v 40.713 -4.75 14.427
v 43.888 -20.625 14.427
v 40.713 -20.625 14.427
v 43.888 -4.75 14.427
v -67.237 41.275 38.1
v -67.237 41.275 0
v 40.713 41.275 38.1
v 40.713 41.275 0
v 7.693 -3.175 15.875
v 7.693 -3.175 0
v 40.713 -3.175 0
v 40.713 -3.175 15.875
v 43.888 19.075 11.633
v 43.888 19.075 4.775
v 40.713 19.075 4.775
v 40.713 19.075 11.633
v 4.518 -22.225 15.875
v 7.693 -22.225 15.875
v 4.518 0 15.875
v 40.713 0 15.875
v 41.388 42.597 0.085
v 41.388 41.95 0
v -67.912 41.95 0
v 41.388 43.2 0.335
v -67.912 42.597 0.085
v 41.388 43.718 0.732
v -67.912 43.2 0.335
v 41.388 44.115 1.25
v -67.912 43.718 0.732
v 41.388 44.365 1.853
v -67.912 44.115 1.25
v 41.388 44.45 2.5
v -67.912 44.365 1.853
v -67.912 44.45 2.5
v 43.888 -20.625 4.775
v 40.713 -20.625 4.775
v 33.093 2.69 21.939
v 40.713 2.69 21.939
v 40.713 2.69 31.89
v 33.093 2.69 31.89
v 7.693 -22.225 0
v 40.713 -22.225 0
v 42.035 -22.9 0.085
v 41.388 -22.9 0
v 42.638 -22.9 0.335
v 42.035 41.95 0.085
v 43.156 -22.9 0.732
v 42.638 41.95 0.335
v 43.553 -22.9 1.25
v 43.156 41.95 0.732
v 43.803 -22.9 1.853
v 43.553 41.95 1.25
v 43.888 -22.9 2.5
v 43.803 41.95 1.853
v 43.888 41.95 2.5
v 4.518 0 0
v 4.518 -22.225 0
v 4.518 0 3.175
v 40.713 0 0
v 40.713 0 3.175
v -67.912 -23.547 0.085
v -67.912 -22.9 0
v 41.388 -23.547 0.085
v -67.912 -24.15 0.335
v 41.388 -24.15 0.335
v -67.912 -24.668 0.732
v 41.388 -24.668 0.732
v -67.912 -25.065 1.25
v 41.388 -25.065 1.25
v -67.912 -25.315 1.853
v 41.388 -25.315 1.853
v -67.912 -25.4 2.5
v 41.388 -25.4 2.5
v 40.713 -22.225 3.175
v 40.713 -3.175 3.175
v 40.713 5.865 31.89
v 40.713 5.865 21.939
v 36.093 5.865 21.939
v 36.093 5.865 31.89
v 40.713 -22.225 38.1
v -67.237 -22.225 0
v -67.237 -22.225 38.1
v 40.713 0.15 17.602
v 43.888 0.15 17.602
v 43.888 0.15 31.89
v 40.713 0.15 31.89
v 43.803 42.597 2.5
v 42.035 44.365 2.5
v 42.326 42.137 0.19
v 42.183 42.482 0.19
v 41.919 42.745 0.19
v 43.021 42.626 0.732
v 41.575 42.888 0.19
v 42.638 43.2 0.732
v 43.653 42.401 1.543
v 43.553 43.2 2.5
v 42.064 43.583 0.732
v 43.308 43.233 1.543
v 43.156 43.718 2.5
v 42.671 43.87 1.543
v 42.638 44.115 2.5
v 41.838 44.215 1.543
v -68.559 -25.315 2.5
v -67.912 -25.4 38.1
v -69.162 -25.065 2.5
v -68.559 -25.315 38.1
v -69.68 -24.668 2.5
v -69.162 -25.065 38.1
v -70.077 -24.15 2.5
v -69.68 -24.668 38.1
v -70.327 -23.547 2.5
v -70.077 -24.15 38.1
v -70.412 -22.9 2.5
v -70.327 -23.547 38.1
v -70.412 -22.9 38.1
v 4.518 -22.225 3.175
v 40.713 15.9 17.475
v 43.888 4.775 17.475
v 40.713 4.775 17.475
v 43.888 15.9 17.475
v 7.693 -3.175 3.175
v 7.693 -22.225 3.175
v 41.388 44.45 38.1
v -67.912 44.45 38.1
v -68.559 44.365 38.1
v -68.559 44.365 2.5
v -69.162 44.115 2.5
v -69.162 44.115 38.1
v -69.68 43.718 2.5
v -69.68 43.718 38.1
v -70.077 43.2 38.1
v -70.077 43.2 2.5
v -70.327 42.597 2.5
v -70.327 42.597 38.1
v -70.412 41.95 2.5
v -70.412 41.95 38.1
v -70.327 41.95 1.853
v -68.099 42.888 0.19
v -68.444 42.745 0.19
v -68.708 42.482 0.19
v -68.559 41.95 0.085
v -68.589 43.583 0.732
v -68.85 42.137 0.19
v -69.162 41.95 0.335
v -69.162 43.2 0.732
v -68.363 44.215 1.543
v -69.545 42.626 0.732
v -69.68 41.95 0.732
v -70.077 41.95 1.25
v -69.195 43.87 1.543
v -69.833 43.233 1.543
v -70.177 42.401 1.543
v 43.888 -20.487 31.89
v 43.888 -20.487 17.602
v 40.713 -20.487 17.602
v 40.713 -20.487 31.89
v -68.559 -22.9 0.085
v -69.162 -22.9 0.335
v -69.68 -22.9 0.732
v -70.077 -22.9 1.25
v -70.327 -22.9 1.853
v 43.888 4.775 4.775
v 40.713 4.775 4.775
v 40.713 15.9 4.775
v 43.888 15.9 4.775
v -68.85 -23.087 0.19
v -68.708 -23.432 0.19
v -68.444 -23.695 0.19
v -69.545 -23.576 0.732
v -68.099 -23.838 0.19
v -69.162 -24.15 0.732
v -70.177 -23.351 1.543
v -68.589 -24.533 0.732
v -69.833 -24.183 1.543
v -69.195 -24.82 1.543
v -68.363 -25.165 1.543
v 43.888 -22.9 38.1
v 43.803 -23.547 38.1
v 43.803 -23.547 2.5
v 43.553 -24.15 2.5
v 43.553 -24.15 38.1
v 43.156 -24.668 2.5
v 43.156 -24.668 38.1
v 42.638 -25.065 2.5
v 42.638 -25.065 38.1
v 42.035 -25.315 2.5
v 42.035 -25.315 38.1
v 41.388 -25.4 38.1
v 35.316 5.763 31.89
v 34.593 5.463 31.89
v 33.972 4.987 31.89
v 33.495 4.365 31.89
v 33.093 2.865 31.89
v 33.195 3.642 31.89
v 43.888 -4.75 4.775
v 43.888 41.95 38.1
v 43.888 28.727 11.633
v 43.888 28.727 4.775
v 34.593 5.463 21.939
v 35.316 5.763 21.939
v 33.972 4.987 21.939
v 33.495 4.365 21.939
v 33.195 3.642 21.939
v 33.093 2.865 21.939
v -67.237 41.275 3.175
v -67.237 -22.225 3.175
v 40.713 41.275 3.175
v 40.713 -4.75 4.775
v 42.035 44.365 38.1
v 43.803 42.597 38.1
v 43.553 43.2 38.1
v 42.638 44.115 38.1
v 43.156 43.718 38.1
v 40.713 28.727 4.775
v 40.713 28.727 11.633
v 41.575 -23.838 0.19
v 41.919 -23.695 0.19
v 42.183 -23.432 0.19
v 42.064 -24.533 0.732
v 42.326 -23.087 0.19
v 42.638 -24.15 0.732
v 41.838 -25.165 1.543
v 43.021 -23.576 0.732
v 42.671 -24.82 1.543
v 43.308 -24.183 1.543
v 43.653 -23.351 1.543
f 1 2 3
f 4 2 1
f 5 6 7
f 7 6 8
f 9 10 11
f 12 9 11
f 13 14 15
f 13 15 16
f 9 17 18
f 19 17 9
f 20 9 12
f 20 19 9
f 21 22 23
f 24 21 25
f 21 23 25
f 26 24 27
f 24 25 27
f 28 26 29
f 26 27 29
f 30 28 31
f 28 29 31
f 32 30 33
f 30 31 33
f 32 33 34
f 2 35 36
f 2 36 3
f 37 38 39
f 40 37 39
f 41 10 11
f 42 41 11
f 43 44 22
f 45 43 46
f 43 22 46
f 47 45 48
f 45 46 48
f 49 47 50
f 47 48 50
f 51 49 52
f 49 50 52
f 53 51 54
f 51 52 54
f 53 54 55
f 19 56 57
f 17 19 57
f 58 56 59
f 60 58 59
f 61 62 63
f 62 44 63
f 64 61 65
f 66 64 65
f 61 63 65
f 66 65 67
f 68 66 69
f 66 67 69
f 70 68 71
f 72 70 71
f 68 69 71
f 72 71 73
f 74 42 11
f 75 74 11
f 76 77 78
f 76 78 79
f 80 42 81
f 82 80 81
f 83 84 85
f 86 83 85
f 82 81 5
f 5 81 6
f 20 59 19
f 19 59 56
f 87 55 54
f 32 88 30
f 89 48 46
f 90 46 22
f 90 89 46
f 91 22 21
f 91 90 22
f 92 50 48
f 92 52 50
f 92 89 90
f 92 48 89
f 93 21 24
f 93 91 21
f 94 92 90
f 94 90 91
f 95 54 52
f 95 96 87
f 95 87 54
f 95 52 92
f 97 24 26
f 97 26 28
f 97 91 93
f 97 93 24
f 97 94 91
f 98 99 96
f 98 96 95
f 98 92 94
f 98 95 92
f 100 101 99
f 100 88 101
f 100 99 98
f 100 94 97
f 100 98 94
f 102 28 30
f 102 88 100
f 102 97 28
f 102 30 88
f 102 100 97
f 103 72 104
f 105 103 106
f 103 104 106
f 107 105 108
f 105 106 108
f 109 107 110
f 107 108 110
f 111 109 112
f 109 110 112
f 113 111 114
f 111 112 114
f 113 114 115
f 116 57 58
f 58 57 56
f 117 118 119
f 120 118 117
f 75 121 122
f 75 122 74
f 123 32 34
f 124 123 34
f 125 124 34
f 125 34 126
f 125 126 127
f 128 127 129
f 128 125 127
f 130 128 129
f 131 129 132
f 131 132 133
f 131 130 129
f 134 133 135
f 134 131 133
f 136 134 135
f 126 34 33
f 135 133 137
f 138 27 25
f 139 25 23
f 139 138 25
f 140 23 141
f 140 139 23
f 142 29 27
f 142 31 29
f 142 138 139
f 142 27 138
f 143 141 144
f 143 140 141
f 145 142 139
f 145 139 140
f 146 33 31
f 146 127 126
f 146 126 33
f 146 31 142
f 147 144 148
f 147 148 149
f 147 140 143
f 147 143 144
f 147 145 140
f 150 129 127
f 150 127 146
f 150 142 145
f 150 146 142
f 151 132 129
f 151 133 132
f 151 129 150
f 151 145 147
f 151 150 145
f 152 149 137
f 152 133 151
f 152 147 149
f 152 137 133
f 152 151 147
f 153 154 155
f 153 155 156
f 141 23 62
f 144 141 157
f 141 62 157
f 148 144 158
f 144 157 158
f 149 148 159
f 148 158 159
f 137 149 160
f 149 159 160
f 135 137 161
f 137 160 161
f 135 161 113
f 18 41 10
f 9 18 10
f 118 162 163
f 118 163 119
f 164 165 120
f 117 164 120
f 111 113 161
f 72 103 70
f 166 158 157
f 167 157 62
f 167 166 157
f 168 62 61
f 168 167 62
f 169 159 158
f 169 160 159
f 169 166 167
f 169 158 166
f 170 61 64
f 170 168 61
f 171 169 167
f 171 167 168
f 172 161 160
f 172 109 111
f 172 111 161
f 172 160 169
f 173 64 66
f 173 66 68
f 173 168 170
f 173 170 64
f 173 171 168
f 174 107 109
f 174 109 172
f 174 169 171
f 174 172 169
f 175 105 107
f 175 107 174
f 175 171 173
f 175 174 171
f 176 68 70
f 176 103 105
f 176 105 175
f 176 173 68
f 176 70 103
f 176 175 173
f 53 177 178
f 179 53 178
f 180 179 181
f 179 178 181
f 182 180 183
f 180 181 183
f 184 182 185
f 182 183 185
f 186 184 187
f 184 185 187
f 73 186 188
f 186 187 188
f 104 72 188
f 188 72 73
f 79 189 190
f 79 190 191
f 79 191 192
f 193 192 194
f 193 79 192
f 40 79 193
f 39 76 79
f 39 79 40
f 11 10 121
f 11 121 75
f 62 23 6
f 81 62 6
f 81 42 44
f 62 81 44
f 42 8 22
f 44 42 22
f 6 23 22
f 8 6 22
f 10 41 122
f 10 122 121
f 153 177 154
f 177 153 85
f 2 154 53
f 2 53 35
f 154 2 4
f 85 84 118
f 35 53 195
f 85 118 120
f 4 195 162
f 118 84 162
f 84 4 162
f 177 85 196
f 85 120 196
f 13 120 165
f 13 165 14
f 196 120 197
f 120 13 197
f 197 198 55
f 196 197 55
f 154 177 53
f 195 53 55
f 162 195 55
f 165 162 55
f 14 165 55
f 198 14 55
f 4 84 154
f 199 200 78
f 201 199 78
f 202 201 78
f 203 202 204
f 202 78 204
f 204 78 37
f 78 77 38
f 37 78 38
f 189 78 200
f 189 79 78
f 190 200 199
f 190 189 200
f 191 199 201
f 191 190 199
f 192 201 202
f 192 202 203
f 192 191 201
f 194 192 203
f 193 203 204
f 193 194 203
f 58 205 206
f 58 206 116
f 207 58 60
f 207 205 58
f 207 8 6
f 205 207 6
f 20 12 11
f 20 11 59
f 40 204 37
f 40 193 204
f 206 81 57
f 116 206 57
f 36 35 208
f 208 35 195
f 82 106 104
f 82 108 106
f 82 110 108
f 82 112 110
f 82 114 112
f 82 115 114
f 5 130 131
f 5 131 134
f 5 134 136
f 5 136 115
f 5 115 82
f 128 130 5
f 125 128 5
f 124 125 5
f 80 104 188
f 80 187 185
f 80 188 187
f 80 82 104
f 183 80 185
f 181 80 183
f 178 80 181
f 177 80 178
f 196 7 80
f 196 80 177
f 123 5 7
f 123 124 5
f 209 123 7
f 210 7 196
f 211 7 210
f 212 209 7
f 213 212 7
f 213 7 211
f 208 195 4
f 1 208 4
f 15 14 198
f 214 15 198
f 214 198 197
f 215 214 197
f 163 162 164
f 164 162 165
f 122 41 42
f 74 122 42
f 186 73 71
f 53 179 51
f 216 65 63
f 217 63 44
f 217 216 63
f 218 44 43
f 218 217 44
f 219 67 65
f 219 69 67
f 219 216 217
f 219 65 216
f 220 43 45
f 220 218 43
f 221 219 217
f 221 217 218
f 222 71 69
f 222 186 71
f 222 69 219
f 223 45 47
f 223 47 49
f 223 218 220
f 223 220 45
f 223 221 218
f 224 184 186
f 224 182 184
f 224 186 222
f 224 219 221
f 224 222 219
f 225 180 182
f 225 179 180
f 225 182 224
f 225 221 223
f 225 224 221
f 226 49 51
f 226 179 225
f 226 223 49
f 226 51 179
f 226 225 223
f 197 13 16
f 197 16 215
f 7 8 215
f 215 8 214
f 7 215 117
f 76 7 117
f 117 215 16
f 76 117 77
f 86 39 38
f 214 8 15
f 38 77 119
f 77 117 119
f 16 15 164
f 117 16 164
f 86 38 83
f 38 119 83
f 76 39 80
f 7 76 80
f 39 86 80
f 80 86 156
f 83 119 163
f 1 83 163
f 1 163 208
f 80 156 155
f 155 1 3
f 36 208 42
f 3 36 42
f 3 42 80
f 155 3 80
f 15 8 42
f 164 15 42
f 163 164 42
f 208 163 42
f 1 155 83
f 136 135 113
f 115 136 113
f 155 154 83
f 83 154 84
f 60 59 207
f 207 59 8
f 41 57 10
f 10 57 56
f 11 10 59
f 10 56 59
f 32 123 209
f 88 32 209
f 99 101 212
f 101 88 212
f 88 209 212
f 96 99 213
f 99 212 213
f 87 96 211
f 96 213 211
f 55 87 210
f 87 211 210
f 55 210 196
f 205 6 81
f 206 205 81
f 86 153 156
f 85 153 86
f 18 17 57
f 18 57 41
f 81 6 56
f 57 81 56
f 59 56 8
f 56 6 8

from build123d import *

# Parameters (mm, degrees)
F0_W     = 33.02
F0_H     = 41.275
F0_W_2   = 3.175
F1_DEPTH = 3.175
F0_H_2   = 19.05
F2_DEPTH = 15.875
F3_DEPTH = 38.1
F4_W     = 15.875
F4_H     = 9.652
F4_W_2   = 11.1252
F4_H_2   = 12.7
F4_W_3   = 9.652
F4_H_3   = 6.858
F4_W_4   = 20.6375
F4_H_4   = 14.2875
F5_DEPTH = 6.604
F6_W     = 3.175
F6_H     = 9.9507730049
F7_DEPTH = 7.62
F8_R     = 3
F9_R     = 2.5
F10_R    = 2.5
F11_R    = 2.5
F12_R    = 2.5
F13_R    = 2.5


# Not quite as in the source:
# - a feature names something its author has since deleted; it is built from what else it names


with BuildPart() as f1:
    # F0 (on Top) → F1 (new body)
    with BuildSketch(Plane.XY):
        with Locations((24.2028696799, 20.6375)):
            Rectangle(F0_W, F0_H)
        Polygon((4.5178696799, 0), (4.5178696799, 41.275), (-67.2371303201, 41.275), (-67.2371303201, -22.225), (4.5178696799, -22.225), align=None)
        with Locations((6.1053696799, 20.6375)):
            Rectangle(F0_W_2, F0_H)
    extrude(amount=F1_DEPTH)


with BuildPart() as f1b:
    # F0 (on Top) → F1, piece 2 (new body)
    with BuildSketch(Plane.XY):
        with Locations((24.2028696799, -12.7)):
            Rectangle(F0_W, F0_H_2)
    extrude(amount=F1_DEPTH)


with BuildPart() as f2:
    # F0 (on Top) → F2 (new body)
    with BuildSketch(Plane.XY):
        Polygon((40.7128696799, -3.175), (40.7128696799, 0), (7.6928696799, 0), (4.5178696799, 0), (4.5178696799, -22.225), (7.6928696799, -22.225), (7.6928696799, -3.175), align=None)
    extrude(amount=F2_DEPTH)


with BuildPart() as f3:
    # F0 (on Top) → F3 (new body)
    with BuildSketch(Plane.XY):
        Polygon((43.8878696799, 44.45), (-70.4121303201, 44.45), (-70.4121303201, -25.4), (43.8878696799, -25.4), (43.8878696799, 0), align=None)
        Polygon((7.6928696799, 41.275), (40.7128696799, 41.275), (40.7128696799, 0), (40.7128696799, -3.175), (40.7128696799, -22.225), (7.6928696799, -22.225), (4.5178696799, -22.225), (-67.2371303201, -22.225), (-67.2371303201, 41.275), (4.5178696799, 41.275), align=None, mode=Mode.SUBTRACT)
    extrude(amount=F3_DEPTH)

    # F4 (on face) → F5 (cut)
    with BuildSketch(Plane.YZ.offset(43.8878696799)):
        with Locations((-12.6873, 9.6012)):
            Rectangle(F4_W, F4_H)
        with Locations((10.3378, 11.1252)):
            Rectangle(F4_W_2, F4_H_2)
        with Locations((23.9014, 8.2042)):
            Rectangle(F4_W_3, F4_H_3)
        with Locations((-10.1683871388, 24.74595)):
            Rectangle(F4_W_4, F4_H_4)
    extrude(amount=-F5_DEPTH, mode=Mode.SUBTRACT)

    # F6 (on face) → F7 (join)
    with BuildSketch(Plane(origin=(40.7128696799, 0, 0), x_dir=(0, -1, 0), z_dir=(-1, 0, 0))):
        with Locations((-4.2778628612, 26.9143134976)):
            Rectangle(F6_W, F6_H)
    extrude(amount=F7_DEPTH)

    # F8
    f8_edges = [f3.edges().sort_by_distance(p)[0] for p in [
        (33.09287, 5.865363, 26.914313),
    ]]
    fillet(f8_edges, radius=F8_R)

    # F9
    f9_edges = [f3.edges().sort_by_distance(p)[0] for p in [
        (-70.41213, 44.45, 19.05),
    ]]
    fillet(f9_edges, radius=F9_R)

    # F10
    f10_edges = [f3.edges().sort_by_distance(p)[0] for p in [
        (43.88787, 44.45, 19.05),
    ]]
    fillet(f10_edges, radius=F10_R)

    # F11
    f11_edges = [f3.edges().sort_by_distance(p)[0] for p in [
        (43.88787, -25.4, 19.05),
    ]]
    fillet(f11_edges, radius=F11_R)

    # F12
    f12_edges = [f3.edges().sort_by_distance(p)[0] for p in [
        (-70.41213, -25.4, 19.05),
    ]]
    fillet(f12_edges, radius=F12_R)

    # F13
    f13_edges = [f3.edges().sort_by_distance(p)[0] for p in [
        (-13.26213, -25.4, 0),
        (-69.679897, -24.667767, 0),
        (-70.41213, 9.525, 0),
        (-69.679897, 43.717767, 0),
        (-13.26213, 44.45, 0),
        (43.155637, 43.717767, 0),
        (43.88787, 9.525, 0),
        (43.155637, -24.667767, 0),
    ]]
    fillet(f13_edges, radius=F13_R)


solid = Compound([f1.part, f1b.part, f2.part, f3.part])
